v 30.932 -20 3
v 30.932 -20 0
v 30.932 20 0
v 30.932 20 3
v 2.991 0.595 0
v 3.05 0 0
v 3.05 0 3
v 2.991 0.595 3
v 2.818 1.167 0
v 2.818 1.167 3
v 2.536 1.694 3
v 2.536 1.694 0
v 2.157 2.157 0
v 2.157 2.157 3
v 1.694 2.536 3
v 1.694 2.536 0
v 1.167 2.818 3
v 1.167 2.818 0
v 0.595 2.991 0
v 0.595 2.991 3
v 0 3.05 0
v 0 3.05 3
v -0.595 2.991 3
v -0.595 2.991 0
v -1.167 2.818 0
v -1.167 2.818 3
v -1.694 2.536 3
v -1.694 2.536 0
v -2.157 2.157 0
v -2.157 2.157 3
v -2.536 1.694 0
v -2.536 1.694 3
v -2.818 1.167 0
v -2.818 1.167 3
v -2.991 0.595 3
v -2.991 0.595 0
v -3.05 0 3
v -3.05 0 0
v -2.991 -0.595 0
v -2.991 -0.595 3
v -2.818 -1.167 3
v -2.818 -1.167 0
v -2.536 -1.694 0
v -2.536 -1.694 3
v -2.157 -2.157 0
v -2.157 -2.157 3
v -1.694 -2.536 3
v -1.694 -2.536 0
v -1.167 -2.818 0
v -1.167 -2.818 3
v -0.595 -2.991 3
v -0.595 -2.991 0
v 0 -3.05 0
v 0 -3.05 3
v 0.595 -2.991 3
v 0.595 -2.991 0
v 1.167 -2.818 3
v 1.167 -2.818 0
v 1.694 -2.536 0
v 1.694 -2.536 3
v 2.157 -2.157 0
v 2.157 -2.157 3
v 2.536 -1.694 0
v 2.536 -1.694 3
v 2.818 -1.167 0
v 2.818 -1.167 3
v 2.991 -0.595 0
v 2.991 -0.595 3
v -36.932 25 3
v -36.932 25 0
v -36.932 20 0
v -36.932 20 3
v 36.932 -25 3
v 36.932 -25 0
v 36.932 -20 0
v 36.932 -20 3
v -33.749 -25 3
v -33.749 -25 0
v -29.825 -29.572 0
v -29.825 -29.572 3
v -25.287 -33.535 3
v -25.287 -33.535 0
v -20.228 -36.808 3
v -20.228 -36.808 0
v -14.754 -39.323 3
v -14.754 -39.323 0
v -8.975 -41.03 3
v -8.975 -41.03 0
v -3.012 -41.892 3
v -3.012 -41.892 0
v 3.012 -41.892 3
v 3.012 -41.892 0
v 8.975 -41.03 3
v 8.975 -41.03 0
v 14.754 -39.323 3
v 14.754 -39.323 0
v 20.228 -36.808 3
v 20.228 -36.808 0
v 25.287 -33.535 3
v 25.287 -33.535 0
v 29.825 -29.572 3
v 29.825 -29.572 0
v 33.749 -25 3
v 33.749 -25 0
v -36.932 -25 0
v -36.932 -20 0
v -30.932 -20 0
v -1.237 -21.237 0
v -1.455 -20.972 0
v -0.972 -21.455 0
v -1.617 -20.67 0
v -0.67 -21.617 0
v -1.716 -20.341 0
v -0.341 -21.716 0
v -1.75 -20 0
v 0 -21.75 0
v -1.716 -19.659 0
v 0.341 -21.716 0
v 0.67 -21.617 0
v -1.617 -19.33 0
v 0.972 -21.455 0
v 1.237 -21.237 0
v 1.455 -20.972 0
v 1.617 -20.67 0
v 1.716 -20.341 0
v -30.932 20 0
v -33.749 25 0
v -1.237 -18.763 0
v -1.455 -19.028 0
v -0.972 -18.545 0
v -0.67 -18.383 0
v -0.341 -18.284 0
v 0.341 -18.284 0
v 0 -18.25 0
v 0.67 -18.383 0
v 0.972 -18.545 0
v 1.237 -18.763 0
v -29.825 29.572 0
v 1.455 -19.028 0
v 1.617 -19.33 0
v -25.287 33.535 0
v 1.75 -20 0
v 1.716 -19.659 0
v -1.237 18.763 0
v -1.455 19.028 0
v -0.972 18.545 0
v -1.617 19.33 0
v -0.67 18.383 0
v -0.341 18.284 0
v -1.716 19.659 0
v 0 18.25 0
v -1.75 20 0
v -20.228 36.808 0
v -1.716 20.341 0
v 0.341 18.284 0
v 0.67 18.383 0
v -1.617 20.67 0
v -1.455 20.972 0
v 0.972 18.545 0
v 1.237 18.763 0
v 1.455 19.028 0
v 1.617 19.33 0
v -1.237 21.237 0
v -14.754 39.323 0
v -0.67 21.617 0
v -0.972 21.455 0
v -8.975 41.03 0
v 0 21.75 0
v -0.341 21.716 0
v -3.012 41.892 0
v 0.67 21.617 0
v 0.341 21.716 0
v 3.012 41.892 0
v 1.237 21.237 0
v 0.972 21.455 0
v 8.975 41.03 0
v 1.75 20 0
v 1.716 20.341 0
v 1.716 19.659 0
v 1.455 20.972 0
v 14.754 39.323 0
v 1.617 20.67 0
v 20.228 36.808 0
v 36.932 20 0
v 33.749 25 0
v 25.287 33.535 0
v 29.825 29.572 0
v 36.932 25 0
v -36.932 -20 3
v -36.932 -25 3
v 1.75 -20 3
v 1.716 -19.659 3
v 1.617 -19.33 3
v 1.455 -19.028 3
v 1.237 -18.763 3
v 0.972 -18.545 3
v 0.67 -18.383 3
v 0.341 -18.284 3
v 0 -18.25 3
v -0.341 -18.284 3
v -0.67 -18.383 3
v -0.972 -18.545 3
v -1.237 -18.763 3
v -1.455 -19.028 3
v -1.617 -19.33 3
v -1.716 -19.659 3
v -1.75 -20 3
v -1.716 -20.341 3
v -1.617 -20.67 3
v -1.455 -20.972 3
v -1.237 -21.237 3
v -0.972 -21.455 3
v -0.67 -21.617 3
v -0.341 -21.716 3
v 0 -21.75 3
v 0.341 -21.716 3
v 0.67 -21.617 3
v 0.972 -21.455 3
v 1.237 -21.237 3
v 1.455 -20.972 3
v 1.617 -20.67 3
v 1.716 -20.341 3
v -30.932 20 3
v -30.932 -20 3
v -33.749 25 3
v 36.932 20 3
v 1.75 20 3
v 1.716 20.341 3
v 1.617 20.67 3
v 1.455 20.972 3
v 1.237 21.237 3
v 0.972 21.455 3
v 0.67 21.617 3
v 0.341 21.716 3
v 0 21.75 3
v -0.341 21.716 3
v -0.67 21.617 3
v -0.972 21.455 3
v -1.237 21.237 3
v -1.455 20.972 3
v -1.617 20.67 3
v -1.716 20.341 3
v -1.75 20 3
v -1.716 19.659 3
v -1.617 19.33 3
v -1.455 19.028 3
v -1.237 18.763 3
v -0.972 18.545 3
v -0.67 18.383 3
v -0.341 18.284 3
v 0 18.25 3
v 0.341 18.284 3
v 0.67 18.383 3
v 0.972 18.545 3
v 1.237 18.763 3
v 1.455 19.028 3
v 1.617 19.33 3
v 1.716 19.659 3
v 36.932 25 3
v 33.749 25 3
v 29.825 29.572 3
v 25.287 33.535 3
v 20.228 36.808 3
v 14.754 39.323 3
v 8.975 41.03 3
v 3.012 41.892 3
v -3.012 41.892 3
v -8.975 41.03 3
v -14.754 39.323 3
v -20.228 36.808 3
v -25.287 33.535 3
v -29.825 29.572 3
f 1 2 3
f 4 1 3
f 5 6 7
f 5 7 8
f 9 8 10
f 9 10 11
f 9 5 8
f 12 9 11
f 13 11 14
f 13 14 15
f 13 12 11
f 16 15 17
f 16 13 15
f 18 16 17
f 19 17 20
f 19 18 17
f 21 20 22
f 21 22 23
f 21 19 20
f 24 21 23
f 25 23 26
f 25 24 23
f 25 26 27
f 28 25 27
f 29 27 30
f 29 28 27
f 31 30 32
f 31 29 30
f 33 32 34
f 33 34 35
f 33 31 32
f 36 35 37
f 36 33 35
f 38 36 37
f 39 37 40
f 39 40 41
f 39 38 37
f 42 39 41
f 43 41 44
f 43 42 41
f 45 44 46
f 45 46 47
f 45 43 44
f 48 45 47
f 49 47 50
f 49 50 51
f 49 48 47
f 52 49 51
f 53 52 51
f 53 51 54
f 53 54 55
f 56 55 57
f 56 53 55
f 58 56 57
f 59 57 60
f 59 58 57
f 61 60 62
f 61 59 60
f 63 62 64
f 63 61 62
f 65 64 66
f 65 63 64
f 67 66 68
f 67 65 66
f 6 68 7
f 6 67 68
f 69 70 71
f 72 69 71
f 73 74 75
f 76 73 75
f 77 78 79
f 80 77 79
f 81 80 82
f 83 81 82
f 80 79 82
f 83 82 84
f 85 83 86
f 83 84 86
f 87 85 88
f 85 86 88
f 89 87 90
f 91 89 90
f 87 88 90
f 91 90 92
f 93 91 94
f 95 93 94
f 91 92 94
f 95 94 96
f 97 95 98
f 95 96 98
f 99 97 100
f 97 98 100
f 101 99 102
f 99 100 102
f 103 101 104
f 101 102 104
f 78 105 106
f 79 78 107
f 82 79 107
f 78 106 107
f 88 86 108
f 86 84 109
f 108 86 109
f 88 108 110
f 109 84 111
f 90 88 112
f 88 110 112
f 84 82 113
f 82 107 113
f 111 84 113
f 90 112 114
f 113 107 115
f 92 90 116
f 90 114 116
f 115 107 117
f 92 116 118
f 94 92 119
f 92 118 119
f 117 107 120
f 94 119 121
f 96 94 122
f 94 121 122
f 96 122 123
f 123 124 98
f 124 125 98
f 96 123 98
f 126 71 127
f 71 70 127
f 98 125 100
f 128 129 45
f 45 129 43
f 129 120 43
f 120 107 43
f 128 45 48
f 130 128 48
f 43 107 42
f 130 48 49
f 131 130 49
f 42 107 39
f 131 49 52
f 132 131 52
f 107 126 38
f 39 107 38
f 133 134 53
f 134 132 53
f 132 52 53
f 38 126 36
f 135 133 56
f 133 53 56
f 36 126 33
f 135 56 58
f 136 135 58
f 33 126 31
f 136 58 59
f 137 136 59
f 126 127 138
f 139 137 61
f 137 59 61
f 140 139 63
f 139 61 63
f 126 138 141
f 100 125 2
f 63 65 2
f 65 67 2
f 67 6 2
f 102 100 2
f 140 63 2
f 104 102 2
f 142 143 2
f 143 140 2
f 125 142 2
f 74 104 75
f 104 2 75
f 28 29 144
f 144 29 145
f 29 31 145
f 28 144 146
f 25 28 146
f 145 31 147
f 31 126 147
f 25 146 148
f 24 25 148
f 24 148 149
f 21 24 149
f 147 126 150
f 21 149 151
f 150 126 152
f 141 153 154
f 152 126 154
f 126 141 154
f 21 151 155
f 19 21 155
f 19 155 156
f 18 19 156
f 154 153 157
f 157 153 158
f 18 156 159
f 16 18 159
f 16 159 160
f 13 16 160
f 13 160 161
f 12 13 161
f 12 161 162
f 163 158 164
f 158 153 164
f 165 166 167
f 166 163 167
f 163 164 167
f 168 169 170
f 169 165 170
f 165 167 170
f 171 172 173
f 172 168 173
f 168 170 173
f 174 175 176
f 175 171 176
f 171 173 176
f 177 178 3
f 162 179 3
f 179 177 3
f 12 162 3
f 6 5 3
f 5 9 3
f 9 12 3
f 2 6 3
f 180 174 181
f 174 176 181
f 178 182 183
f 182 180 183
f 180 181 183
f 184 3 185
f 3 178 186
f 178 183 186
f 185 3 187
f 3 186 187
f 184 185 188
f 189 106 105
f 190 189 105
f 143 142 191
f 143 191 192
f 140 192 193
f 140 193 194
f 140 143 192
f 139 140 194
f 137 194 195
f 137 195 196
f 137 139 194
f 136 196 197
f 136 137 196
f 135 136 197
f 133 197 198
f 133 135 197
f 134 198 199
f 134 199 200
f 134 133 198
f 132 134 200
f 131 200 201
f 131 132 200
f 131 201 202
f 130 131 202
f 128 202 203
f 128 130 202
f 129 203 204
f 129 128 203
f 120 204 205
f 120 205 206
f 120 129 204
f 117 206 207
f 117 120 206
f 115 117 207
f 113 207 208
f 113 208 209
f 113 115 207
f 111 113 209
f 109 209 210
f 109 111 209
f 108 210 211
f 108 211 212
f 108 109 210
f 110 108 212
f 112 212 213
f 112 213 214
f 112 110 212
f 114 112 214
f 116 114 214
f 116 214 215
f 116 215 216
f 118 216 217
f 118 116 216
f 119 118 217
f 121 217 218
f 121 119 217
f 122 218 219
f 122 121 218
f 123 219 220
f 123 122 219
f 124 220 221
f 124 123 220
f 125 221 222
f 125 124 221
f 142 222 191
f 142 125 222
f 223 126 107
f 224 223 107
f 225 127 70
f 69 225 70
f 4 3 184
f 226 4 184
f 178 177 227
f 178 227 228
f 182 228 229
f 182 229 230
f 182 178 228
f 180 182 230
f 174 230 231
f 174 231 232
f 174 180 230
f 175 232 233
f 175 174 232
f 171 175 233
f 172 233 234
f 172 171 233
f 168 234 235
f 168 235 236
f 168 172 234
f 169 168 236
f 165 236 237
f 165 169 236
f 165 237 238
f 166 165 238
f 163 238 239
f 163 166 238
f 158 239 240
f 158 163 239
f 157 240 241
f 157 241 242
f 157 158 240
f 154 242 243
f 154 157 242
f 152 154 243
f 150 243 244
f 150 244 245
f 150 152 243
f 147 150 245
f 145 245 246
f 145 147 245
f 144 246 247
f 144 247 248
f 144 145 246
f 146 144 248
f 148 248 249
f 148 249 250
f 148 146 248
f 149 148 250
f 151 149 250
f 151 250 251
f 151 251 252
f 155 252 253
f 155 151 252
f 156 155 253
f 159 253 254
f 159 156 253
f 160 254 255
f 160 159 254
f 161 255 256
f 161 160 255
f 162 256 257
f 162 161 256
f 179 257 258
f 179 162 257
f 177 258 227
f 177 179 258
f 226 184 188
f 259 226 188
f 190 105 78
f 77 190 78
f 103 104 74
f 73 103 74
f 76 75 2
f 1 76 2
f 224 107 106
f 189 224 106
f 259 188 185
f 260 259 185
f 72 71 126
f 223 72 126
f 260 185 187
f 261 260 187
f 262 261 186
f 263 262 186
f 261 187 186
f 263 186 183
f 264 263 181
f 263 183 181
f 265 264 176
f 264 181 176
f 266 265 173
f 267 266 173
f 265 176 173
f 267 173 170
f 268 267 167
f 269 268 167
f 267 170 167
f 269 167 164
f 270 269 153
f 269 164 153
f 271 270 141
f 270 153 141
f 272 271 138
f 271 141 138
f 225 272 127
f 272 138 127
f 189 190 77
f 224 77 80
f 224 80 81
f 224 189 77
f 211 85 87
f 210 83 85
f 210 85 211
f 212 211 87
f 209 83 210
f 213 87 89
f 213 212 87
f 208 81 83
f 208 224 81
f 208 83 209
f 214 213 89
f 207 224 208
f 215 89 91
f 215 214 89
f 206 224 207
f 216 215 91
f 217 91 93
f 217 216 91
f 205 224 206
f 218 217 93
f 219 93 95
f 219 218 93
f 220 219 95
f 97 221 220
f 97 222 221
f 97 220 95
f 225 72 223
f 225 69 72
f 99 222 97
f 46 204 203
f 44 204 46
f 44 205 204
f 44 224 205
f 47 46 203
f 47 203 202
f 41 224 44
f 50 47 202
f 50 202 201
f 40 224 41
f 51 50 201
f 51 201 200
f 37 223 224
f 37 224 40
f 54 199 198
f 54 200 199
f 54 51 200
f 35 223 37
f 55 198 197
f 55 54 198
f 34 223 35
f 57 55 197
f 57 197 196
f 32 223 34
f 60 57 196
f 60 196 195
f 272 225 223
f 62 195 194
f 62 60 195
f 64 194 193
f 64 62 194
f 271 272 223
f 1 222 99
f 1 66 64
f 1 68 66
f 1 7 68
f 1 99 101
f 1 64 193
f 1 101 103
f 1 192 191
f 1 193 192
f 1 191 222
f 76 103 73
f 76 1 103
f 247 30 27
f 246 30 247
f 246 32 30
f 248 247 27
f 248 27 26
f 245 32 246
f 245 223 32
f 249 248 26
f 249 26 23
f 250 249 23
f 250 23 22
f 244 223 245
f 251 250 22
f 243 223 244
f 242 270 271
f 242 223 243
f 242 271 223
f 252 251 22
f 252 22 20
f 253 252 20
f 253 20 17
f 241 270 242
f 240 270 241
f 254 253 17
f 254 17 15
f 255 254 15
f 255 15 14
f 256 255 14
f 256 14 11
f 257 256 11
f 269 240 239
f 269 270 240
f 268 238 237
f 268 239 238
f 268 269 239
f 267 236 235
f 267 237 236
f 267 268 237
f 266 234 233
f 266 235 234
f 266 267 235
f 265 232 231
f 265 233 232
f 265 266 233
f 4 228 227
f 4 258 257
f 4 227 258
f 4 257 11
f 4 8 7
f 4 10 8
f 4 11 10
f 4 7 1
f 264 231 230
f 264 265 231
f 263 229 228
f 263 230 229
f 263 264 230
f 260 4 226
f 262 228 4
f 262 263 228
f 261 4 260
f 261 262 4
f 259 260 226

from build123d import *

# Parameters (mm, degrees)
CROQUIS1_R              = 3.05
CROQUIS1_R_2            = 1.75
SALIENTE_EXTRUIR1_DEPTH = 3


with BuildPart() as part:
    # Croquis1 → Saliente-Extruir1 (new body)
    with BuildSketch(Plane.XY):
        with BuildLine():
            Line((-36.932370625, 20), (-30.932370625, 20))
            Line((-30.932370625, 20), (-30.932370625, -20))
            Line((-30.932370625, -20), (-36.932370625, -20))
            Line((-36.932370625, -20), (-36.932370625, -25))
            Line((-36.932370625, -25), (-33.749074061, -25))
            ThreePointArc((-33.749074061, -25), (0, -42), (33.749074061, -25))
            Line((33.749074061, -25), (36.932370625, -25))
            Line((36.932370625, -25), (36.932370625, -20))
            Line((36.932370625, -20), (30.932370625, -20))
            Line((30.932370625, -20), (30.932370625, 20))
            Line((30.932370625, 20), (36.932370625, 20))
            Line((36.932370625, 20), (36.932370625, 25))
            Line((36.932370625, 25), (33.749074061, 25))
            ThreePointArc((33.749074061, 25), (0, 42), (-33.749074061, 25))
            Line((-33.749074061, 25), (-36.932370625, 25))
            Line((-36.932370625, 25), (-36.932370625, 20))
        make_face()
        Circle(CROQUIS1_R, mode=Mode.SUBTRACT)
        with Locations((0, 20)):
            Circle(CROQUIS1_R_2, mode=Mode.SUBTRACT)
        with Locations((0, -20)):
            Circle(CROQUIS1_R_2, mode=Mode.SUBTRACT)
    extrude(amount=SALIENTE_EXTRUIR1_DEPTH)


solid = part.part
